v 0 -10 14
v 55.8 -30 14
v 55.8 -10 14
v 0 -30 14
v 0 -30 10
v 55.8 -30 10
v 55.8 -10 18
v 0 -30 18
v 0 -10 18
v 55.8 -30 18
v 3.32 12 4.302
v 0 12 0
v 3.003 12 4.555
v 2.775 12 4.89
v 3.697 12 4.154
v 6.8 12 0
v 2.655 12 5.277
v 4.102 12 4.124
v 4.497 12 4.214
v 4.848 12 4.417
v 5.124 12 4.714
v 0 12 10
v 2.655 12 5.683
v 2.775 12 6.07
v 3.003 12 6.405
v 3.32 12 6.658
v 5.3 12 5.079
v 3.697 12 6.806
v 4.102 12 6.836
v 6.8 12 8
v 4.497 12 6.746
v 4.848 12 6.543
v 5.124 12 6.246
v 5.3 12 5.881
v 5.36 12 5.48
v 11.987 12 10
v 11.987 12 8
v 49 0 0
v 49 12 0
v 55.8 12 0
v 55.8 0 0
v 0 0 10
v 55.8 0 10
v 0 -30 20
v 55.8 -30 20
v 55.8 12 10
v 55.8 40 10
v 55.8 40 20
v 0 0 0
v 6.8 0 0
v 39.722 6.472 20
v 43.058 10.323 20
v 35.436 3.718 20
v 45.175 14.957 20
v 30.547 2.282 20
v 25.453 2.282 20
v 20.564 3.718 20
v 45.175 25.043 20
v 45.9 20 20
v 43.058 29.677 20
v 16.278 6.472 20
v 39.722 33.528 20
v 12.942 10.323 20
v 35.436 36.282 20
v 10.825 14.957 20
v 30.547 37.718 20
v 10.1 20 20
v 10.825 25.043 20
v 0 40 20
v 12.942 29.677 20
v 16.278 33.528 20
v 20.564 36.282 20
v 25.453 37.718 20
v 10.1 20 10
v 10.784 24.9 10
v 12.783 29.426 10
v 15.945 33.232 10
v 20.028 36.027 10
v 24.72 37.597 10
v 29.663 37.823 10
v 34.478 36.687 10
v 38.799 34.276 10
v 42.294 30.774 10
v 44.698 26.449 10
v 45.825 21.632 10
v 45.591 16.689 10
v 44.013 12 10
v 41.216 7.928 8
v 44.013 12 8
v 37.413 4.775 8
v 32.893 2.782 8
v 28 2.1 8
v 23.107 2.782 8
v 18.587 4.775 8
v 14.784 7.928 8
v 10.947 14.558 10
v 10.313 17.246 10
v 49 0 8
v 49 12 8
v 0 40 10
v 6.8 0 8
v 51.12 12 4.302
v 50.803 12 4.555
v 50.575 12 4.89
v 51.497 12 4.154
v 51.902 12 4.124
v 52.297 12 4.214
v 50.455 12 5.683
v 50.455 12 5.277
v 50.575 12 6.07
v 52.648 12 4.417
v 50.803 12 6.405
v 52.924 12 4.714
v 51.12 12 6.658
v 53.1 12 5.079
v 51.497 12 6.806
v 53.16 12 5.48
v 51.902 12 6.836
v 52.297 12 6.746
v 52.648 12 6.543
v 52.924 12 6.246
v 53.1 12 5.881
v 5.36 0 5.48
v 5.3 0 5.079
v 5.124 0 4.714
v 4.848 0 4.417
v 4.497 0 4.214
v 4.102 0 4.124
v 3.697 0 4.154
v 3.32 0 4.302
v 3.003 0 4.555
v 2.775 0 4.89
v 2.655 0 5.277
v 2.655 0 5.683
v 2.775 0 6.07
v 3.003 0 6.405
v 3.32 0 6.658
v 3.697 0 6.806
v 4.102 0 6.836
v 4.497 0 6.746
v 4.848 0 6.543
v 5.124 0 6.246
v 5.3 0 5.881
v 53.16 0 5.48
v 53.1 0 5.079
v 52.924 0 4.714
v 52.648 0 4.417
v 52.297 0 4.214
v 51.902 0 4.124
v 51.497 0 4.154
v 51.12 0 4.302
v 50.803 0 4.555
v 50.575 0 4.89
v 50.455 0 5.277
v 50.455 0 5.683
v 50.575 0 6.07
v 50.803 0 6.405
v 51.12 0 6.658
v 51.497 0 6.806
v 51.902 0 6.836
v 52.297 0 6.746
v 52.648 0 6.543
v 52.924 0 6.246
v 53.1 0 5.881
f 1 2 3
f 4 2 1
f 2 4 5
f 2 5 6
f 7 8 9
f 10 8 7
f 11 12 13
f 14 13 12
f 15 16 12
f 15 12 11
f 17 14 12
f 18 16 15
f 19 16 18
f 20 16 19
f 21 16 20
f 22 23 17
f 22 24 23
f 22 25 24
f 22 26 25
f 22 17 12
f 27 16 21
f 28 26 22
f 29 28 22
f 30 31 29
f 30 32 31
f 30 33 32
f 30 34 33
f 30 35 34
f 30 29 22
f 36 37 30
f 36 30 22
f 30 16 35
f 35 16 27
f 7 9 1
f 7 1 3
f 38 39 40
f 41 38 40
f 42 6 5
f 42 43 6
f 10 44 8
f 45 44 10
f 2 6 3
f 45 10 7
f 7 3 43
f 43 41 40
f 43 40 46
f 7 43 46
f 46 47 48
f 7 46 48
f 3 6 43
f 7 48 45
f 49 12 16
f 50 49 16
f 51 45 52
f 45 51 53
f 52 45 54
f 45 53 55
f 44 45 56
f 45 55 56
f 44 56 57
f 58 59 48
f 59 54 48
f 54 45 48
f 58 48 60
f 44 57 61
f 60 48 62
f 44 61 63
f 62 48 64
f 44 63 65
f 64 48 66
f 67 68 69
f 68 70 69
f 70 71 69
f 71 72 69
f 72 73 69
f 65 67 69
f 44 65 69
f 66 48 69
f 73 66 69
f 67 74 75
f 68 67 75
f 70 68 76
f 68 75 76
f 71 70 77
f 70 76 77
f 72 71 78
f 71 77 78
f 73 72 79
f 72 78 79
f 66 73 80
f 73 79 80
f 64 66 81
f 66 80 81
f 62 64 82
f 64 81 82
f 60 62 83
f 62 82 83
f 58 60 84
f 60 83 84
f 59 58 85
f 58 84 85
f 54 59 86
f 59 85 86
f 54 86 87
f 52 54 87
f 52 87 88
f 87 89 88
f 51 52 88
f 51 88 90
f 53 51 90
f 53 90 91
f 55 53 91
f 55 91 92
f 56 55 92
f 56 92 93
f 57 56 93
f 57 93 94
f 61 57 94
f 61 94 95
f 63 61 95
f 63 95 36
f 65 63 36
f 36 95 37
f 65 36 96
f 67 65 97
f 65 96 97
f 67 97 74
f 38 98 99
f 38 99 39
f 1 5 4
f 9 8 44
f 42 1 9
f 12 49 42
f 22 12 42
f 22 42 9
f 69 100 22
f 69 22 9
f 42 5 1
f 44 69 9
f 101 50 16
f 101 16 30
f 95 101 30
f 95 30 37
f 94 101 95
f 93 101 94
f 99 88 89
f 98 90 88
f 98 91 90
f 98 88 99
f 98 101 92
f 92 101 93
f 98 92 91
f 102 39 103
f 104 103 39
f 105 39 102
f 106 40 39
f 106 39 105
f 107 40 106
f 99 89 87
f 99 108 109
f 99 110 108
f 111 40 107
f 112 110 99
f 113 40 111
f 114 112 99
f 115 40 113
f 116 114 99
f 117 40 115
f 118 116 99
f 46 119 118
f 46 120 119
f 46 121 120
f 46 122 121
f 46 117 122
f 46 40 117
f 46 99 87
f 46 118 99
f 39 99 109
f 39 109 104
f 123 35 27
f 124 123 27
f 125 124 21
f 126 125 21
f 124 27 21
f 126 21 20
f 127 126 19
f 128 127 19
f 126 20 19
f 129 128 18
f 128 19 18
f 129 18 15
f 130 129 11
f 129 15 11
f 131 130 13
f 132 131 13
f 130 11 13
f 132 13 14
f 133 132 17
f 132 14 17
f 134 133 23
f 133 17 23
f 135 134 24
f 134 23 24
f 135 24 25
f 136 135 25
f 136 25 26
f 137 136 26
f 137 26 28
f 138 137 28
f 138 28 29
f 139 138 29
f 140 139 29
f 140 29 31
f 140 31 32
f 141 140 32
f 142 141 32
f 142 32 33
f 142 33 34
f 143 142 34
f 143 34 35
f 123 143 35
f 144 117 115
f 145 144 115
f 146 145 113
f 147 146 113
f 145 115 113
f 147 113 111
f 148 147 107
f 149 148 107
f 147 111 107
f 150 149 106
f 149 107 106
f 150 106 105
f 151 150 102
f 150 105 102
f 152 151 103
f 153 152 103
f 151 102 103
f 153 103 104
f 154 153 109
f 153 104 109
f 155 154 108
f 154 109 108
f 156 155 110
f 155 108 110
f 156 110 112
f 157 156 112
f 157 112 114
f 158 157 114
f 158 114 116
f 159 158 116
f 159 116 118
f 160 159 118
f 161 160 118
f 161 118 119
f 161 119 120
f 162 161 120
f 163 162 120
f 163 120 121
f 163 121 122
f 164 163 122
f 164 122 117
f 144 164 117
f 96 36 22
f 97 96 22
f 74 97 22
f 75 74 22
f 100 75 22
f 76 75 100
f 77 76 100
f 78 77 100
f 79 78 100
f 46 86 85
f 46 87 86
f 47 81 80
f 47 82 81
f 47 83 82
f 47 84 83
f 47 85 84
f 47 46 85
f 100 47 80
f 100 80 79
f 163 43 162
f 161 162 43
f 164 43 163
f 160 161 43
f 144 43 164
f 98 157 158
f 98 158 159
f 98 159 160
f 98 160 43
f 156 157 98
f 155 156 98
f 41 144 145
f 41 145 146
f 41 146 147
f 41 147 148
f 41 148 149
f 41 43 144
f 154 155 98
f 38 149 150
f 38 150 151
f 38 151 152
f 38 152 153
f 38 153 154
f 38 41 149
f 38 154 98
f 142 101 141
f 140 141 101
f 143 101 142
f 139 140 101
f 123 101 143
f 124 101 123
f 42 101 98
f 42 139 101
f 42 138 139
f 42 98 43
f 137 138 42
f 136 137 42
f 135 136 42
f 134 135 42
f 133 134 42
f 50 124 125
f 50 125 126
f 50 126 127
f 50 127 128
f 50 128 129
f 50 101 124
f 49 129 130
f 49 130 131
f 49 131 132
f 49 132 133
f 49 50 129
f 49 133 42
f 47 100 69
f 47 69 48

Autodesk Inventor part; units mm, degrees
ref_plane "YZ Plane" through (0, 0, 0) normal (1, 0, 0) x (0, 1, 0)
ref_plane "XZ Plane" through (0, 0, 0) normal (0, 1, 0) x (-1, 0, 0)
ref_plane "XY Plane" through (0, 0, 0) normal (0, 0, 1) x (1, 0, 0)
sketch "Sketch1" plane through (0, 0, 0) normal (0, 0, 1) x (1, 0, 0)
  line L0 (0, 40) -> (55.8, 40)
  line L1 (55.8, 40) -> (55.8, 0)
  line L2 (55.8, 0) -> (0, 0)
  line L3 (0, 0) -> (0, 40)
  dimension "d0" = 55.8
  dimension "d1" = 40
extrude "Extrusion1" add sketch "Sketch1" along normal blind 20
sketch "Sketch2" plane through (55.8, 0, 0) normal (1, 0, 0) x (0, 0, -1)
  line L0 (0, 40) -> (-20, 40) projected
  line L1 (0, 0) -> (0, 40) projected
  line L2 (-10, 40) -> (0, 40)
  line L3 (0, 40) -> (0, 12)
  line L4 (0, 12) -> (-10, 12)
  line L5 (-10, 12) -> (-10, 40)
  dimension "d4" = 10
extrude "Extrusion2" cut sketch "Sketch2" against normal blind 60
sketch "Sketch3" plane through (55.8, 12, 10) normal (0, 1, 0) x (1, 0, 0)
  circle A0 centre (-51.8, 4.52) radius 1.36
  circle A1 centre (-4, 4.52) radius 1.36
  line L0 (-55.8, 10) -> (0, 10) projected
  line L1 (-55.8, 0) -> (-55.8, 10) projected
  line L2 (0, 10) -> (0, 0) projected
  point P0 (-55.8, 5)
  point P1 (0, 5)
  dimension "d32" = 4
  dimension "d33" = 4
extrude "Extrusion3" cut sketch "Sketch3" against normal blind 20
sketch "Sketch4" plane through (0, 0, 20) normal (0, 0, 1) x (1, 0, 0)
  point P0 (0, 0)
sketch "Sketch6" plane through (0, 0, 0) normal (0, 0, -1) x (-1, 0, 0)
  circle A0 centre (-28, 20) radius 17.9
  point P0 (0, 0)
  dimension "d18" = 35.8
extrude "Extrusion4" cut sketch "Sketch6" along normal mid plane 60
sketch "Sketch8" plane through (0, 0, 0) normal (0, -1, 0) x (1, 0, 0)
  line L0 (49, 0) -> (6.8, 0)
  line L1 (6.8, 0) -> (6.8, 8)
  line L2 (6.8, 8) -> (49, 8)
  line L3 (49, 8) -> (49, 0)
  line L4 (55.8, 0) -> (55.8, 20) projected
  line L5 (0, 0) -> (0, 20) projected
  point P0 (6.8, 4)
  dimension "d27" = 6.8
  dimension "d28" = 6.8
extrude "Extrusion6" cut sketch "Sketch8" against normal blind 13
sketch "Sketch9" plane through (0, 0, 20) normal (0, -1, 0) x (1, 0, 0)
  line L0 (55.8, 0) -> (0, 0) projected
  line L1 (55.8, -10) -> (55.8, 0) projected
  line L2 (0, 0) -> (55.8, 0)
  line L3 (55.8, 0) -> (55.8, -10)
  line L4 (55.8, -10) -> (0, -10)
  line L5 (0, -10) -> (0, 0)
  point P0 (0, -20)
  dimension "d34" = 10
extrude "Extrusion7" add sketch "Sketch9" along normal blind 30
sketch "Sketch10" plane through (0, -30, 20) normal (0, -1, 0) x (1, 0, 0)
  line L0 (0, -10) -> (0, 0) projected
  line L1 (55.8, -10) -> (55.8, 0) projected
  line L2 (0, -2) -> (55.8, -2)
  line L3 (55.8, -2) -> (55.8, -6)
  line L4 (55.8, -6) -> (0, -6)
  line L5 (0, -6) -> (0, -2)
  point P0 (0, -20)
  point P1 (0, -6)
extrude "Extrusion8" cut sketch "Sketch10" against normal blind 20
